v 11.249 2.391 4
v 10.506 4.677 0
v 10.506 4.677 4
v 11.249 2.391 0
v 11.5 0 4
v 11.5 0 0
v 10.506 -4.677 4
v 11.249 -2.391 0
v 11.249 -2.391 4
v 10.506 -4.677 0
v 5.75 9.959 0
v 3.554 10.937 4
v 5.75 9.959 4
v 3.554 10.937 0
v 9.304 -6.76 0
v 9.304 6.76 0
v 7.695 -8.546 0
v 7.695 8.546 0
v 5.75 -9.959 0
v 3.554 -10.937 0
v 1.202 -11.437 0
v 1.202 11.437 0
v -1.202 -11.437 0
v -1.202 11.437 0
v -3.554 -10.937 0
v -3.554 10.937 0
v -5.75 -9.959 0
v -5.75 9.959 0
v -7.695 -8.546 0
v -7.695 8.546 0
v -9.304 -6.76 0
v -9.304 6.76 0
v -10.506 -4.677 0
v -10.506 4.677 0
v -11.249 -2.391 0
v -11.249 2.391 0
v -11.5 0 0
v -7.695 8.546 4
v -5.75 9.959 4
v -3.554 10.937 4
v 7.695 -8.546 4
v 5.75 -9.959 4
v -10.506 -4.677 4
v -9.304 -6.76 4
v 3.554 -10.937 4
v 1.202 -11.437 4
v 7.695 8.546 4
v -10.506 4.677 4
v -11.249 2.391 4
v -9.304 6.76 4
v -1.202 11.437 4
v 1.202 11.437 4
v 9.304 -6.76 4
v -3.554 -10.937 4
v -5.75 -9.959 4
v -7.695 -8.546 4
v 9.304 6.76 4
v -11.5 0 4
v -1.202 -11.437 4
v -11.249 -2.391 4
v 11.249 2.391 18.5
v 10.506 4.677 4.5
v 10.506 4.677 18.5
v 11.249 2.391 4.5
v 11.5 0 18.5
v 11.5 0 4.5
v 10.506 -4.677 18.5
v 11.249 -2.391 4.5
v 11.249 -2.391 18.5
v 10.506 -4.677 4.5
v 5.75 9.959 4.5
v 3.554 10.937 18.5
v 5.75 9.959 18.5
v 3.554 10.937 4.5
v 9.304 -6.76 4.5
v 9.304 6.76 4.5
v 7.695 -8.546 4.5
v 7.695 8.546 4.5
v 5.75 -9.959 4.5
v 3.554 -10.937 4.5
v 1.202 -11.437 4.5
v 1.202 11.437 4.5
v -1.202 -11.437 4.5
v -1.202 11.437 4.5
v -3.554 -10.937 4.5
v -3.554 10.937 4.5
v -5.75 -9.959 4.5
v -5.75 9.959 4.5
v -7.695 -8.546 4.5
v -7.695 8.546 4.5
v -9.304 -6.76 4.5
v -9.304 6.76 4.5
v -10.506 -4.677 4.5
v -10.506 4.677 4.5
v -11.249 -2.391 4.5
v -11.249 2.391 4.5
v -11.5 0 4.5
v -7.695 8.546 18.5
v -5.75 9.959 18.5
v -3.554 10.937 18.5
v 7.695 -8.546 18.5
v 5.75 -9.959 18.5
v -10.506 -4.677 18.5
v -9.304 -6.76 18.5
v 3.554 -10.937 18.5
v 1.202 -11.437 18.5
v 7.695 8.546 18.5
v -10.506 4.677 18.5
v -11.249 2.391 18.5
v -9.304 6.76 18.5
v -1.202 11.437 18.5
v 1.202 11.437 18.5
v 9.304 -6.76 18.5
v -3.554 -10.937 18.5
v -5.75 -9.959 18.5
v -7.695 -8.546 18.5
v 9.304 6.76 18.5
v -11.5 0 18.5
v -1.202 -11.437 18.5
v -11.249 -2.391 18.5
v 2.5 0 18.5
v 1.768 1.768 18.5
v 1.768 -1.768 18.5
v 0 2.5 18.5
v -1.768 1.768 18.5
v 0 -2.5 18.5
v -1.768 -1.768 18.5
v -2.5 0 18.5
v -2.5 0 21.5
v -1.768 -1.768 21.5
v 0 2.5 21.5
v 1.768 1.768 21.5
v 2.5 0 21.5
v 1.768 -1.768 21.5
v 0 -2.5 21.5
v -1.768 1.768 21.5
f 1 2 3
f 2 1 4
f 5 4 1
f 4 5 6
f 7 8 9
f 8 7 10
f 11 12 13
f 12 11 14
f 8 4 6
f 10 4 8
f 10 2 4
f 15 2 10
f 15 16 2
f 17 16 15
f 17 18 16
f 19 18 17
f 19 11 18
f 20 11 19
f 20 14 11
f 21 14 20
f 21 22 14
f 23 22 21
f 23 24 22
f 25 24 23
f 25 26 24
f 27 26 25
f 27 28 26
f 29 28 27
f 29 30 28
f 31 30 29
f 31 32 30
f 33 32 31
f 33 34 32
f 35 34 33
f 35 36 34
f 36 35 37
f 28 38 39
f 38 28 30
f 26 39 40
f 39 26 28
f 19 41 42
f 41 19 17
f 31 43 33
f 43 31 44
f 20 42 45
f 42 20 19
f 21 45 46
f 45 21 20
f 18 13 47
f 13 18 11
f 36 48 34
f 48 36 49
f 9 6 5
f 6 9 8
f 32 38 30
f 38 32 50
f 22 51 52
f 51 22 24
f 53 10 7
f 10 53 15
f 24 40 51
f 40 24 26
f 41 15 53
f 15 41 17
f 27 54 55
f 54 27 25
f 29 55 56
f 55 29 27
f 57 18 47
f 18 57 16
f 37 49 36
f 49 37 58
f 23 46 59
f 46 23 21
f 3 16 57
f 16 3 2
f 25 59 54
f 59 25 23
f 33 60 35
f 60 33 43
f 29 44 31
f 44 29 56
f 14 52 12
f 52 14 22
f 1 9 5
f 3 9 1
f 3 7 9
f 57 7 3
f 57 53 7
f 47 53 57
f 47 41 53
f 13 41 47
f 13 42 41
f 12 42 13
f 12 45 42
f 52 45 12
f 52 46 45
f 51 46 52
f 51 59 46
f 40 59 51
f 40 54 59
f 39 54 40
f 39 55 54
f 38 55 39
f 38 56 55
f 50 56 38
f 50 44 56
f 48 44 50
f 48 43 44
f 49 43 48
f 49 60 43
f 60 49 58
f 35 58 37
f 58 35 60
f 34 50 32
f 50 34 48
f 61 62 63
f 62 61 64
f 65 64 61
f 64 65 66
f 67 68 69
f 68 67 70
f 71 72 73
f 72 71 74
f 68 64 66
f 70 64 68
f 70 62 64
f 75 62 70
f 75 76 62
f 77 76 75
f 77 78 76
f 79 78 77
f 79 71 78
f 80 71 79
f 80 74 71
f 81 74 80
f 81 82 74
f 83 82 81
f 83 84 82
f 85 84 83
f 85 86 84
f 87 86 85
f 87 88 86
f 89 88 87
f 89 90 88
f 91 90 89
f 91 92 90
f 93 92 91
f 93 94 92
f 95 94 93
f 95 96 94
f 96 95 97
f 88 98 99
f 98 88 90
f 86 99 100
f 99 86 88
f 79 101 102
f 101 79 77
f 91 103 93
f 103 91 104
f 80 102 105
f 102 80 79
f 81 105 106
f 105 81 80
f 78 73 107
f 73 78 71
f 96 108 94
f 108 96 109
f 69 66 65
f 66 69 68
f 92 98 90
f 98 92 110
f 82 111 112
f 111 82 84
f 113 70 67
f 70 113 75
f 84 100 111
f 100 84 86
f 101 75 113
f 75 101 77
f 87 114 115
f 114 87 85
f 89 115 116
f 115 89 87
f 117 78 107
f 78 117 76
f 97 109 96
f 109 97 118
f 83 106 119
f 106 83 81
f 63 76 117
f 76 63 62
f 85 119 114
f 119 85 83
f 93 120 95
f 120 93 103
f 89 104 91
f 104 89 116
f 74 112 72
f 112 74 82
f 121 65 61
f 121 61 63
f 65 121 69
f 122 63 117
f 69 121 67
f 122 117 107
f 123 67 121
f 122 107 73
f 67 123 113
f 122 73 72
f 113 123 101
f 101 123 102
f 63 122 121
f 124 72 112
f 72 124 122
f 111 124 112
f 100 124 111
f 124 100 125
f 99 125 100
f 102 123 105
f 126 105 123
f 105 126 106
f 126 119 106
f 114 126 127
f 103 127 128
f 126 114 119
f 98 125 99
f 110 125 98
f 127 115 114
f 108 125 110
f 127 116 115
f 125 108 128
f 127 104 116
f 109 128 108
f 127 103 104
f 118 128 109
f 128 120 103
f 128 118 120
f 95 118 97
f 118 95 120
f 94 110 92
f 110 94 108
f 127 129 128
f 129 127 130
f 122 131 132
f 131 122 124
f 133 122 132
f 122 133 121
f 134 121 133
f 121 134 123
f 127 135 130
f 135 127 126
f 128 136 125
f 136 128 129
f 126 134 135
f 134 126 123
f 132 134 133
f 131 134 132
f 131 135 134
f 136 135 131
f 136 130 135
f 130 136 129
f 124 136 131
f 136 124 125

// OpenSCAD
// file: params.scad
DOME_DIA = 150;
DOME_THICK = 2.5;
ORING_DIA = 5.0;

function r_from_dia(d) = d / 2;
// main file
include<params.scad>

module motor()
{
    translate([0,0,2.0])
        cylinder(r=r_from_dia(23), h=4, center=true);
    translate([0,0,11.5])
        cylinder(r=r_from_dia(23), h=14, center=true);
    translate([0,0,18.5+1.5])
        cylinder(r=r_from_dia(5), h=3, center=true);
}

motor();
